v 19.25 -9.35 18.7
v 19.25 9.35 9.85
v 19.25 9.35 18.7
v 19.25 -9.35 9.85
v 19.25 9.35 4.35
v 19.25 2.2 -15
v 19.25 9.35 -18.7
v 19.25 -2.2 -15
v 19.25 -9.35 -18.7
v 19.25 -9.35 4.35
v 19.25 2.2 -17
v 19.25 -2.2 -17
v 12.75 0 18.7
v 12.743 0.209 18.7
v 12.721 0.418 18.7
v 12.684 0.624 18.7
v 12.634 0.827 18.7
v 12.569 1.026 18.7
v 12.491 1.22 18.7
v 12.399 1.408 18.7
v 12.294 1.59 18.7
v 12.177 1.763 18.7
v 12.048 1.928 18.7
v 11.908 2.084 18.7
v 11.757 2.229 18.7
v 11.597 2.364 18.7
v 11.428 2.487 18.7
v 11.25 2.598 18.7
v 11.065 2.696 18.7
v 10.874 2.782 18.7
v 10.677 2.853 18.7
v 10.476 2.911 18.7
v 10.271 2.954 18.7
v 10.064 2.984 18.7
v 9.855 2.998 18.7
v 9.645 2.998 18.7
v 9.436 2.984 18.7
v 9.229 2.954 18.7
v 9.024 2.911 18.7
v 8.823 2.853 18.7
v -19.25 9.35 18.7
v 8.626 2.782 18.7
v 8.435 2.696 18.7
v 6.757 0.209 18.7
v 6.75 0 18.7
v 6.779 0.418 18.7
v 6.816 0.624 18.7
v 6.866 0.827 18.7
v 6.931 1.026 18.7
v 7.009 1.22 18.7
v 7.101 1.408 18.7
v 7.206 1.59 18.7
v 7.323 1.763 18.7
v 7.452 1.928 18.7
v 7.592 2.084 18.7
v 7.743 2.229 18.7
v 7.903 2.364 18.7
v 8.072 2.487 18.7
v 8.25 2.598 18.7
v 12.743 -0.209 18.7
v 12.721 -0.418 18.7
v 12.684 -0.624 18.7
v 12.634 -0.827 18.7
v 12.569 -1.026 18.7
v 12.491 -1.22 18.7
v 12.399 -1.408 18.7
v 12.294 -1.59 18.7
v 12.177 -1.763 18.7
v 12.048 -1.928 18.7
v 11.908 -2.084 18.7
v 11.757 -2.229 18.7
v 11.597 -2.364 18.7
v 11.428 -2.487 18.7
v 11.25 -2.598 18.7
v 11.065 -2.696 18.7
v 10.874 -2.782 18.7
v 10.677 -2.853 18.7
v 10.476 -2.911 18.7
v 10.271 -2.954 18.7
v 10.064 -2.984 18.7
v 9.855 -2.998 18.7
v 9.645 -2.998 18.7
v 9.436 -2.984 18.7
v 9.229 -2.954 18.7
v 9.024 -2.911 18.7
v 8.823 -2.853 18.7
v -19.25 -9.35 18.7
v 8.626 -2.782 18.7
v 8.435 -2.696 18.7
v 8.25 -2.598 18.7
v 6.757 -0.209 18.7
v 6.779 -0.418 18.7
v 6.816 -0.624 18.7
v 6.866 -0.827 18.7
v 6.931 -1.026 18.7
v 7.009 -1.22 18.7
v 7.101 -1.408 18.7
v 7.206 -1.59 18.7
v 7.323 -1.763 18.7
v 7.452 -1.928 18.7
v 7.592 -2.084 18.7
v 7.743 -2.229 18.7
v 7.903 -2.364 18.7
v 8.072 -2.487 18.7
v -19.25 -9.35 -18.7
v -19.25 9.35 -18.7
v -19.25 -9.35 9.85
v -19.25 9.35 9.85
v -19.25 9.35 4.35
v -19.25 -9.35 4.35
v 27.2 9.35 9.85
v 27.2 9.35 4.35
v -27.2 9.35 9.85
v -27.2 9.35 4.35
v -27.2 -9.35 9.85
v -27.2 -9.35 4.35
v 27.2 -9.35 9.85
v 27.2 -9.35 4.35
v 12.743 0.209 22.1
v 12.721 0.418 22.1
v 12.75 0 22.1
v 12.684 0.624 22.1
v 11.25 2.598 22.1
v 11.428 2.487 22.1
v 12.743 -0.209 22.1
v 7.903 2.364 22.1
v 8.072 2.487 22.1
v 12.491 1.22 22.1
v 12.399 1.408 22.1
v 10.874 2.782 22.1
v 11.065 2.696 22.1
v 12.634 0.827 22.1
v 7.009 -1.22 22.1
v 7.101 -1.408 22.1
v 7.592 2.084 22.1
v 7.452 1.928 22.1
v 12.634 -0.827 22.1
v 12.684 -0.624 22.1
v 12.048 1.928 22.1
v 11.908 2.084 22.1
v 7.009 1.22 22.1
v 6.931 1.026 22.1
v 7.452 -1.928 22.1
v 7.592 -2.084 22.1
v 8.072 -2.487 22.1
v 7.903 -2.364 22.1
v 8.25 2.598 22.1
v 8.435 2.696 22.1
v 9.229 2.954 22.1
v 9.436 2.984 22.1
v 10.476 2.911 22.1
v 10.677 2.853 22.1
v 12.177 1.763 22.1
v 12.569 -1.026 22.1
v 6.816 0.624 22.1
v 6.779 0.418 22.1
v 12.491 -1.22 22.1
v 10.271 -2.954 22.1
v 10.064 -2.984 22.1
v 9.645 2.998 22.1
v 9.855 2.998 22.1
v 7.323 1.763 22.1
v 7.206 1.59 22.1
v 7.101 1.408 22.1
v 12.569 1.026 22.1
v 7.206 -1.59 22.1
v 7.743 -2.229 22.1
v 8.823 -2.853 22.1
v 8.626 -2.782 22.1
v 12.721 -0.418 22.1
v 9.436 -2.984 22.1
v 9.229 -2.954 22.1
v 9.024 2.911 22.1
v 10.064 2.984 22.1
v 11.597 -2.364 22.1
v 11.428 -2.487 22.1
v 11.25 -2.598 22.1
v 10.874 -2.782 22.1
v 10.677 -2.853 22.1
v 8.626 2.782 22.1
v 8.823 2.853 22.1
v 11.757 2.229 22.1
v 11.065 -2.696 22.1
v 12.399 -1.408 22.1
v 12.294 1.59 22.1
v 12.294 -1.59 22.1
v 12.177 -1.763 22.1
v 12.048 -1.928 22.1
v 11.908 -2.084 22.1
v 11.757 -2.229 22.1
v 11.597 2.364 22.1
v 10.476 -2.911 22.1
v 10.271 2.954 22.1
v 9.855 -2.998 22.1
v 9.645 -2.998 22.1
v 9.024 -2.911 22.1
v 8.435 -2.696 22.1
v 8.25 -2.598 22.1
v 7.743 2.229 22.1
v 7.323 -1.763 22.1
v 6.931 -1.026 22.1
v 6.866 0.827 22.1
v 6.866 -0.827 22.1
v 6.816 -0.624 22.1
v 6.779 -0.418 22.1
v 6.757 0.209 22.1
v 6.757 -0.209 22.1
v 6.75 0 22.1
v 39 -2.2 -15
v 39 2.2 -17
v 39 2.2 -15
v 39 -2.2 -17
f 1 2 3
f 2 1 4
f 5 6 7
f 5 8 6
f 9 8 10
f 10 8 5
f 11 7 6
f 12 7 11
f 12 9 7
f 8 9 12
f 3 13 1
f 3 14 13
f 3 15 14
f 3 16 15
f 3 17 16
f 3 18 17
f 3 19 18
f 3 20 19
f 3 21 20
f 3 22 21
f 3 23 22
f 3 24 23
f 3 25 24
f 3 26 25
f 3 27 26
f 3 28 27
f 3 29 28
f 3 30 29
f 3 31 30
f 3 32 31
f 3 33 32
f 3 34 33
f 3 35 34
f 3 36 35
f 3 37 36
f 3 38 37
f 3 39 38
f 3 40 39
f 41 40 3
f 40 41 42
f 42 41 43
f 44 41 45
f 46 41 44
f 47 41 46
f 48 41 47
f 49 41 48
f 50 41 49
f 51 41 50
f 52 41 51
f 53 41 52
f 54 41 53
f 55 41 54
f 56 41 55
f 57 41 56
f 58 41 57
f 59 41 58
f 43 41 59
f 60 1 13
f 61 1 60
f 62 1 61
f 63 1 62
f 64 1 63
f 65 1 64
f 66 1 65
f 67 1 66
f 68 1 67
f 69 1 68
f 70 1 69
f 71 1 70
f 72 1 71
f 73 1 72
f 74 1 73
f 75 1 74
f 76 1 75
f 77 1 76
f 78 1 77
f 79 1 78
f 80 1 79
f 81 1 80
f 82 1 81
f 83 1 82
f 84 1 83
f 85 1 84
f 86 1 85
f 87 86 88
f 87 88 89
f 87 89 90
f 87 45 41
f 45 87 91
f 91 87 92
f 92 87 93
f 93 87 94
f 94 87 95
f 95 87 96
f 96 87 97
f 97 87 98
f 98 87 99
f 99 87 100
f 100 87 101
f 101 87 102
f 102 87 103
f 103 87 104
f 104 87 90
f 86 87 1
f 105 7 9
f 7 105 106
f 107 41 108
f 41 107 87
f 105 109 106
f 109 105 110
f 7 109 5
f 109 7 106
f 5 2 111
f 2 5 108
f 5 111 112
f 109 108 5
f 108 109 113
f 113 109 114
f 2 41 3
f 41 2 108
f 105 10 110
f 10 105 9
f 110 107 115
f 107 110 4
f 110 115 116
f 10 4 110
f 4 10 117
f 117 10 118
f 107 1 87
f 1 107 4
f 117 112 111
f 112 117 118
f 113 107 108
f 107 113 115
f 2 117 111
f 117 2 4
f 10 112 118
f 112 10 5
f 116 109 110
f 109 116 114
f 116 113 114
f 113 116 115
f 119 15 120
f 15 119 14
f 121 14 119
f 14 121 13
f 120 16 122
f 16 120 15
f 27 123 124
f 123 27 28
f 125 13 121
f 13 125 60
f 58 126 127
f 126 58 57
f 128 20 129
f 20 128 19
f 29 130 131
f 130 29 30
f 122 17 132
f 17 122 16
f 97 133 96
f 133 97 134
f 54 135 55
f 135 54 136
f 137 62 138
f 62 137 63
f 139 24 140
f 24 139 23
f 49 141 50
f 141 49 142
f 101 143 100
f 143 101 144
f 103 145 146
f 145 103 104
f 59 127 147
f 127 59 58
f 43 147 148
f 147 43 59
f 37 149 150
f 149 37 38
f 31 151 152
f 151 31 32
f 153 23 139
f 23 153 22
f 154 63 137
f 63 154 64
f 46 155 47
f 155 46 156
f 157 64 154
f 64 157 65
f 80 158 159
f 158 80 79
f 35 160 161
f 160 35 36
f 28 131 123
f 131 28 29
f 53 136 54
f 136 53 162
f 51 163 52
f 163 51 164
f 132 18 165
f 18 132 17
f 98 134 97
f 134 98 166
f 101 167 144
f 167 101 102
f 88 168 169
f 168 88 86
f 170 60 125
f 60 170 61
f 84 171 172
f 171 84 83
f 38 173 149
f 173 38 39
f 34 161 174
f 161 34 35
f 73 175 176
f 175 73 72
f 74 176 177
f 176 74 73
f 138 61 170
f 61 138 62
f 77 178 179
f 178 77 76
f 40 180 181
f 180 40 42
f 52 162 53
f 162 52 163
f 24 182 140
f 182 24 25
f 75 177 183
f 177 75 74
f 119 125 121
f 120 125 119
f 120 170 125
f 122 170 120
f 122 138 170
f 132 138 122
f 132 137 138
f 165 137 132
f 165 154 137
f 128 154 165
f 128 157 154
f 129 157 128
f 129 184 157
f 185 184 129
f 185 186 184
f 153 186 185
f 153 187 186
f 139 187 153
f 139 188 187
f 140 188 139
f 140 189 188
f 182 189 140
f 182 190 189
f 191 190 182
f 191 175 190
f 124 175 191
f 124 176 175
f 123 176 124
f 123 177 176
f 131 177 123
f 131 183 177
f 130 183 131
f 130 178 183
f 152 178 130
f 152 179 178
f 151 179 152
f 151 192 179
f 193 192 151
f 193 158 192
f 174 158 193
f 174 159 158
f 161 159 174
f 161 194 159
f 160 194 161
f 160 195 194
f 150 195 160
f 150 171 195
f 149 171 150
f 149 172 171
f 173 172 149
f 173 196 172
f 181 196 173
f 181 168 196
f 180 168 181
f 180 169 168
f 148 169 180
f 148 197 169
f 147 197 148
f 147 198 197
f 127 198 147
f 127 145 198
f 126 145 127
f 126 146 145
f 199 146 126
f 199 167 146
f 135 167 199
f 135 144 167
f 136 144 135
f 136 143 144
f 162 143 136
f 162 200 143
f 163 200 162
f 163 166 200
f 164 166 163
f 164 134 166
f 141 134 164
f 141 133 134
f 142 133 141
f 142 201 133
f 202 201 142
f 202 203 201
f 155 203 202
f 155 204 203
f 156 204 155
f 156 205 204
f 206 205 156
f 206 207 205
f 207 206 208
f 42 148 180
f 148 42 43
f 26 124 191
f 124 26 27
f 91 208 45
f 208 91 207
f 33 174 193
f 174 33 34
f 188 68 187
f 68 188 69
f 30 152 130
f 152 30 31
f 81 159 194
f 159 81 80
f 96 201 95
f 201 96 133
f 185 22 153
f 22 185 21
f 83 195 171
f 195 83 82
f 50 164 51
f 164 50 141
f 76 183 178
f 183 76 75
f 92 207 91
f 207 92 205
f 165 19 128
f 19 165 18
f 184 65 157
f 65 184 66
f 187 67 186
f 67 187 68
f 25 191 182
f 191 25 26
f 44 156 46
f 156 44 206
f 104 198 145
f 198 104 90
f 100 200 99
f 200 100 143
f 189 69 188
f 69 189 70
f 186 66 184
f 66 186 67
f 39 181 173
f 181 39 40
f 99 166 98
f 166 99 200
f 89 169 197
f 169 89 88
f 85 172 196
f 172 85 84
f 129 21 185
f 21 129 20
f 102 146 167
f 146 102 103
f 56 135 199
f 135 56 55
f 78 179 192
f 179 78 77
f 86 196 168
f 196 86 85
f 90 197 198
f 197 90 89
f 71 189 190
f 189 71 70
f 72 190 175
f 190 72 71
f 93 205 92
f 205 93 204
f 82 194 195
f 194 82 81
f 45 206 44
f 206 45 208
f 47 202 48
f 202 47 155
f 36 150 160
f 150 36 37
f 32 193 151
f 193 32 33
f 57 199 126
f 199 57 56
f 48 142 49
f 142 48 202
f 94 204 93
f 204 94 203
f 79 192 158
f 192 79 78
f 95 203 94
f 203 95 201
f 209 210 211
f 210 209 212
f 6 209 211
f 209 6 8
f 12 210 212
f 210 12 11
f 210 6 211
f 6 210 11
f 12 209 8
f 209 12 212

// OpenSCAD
$fn = 90;

blockLength = 38.5;
width = 18.7;
blockHeight = 37.4;
cube([blockLength, width, blockHeight], center=true);
translate([0, 0, 25.8-blockHeight/2])
	cube([54.4, width, 5.5], center=true);
translate([blockLength/2-9.5, 0, blockHeight/2])
	cylinder(d=6, h=3.4);
translate([29, 0, -16])
	cube([20, 4.4, 2], center=true);
	
